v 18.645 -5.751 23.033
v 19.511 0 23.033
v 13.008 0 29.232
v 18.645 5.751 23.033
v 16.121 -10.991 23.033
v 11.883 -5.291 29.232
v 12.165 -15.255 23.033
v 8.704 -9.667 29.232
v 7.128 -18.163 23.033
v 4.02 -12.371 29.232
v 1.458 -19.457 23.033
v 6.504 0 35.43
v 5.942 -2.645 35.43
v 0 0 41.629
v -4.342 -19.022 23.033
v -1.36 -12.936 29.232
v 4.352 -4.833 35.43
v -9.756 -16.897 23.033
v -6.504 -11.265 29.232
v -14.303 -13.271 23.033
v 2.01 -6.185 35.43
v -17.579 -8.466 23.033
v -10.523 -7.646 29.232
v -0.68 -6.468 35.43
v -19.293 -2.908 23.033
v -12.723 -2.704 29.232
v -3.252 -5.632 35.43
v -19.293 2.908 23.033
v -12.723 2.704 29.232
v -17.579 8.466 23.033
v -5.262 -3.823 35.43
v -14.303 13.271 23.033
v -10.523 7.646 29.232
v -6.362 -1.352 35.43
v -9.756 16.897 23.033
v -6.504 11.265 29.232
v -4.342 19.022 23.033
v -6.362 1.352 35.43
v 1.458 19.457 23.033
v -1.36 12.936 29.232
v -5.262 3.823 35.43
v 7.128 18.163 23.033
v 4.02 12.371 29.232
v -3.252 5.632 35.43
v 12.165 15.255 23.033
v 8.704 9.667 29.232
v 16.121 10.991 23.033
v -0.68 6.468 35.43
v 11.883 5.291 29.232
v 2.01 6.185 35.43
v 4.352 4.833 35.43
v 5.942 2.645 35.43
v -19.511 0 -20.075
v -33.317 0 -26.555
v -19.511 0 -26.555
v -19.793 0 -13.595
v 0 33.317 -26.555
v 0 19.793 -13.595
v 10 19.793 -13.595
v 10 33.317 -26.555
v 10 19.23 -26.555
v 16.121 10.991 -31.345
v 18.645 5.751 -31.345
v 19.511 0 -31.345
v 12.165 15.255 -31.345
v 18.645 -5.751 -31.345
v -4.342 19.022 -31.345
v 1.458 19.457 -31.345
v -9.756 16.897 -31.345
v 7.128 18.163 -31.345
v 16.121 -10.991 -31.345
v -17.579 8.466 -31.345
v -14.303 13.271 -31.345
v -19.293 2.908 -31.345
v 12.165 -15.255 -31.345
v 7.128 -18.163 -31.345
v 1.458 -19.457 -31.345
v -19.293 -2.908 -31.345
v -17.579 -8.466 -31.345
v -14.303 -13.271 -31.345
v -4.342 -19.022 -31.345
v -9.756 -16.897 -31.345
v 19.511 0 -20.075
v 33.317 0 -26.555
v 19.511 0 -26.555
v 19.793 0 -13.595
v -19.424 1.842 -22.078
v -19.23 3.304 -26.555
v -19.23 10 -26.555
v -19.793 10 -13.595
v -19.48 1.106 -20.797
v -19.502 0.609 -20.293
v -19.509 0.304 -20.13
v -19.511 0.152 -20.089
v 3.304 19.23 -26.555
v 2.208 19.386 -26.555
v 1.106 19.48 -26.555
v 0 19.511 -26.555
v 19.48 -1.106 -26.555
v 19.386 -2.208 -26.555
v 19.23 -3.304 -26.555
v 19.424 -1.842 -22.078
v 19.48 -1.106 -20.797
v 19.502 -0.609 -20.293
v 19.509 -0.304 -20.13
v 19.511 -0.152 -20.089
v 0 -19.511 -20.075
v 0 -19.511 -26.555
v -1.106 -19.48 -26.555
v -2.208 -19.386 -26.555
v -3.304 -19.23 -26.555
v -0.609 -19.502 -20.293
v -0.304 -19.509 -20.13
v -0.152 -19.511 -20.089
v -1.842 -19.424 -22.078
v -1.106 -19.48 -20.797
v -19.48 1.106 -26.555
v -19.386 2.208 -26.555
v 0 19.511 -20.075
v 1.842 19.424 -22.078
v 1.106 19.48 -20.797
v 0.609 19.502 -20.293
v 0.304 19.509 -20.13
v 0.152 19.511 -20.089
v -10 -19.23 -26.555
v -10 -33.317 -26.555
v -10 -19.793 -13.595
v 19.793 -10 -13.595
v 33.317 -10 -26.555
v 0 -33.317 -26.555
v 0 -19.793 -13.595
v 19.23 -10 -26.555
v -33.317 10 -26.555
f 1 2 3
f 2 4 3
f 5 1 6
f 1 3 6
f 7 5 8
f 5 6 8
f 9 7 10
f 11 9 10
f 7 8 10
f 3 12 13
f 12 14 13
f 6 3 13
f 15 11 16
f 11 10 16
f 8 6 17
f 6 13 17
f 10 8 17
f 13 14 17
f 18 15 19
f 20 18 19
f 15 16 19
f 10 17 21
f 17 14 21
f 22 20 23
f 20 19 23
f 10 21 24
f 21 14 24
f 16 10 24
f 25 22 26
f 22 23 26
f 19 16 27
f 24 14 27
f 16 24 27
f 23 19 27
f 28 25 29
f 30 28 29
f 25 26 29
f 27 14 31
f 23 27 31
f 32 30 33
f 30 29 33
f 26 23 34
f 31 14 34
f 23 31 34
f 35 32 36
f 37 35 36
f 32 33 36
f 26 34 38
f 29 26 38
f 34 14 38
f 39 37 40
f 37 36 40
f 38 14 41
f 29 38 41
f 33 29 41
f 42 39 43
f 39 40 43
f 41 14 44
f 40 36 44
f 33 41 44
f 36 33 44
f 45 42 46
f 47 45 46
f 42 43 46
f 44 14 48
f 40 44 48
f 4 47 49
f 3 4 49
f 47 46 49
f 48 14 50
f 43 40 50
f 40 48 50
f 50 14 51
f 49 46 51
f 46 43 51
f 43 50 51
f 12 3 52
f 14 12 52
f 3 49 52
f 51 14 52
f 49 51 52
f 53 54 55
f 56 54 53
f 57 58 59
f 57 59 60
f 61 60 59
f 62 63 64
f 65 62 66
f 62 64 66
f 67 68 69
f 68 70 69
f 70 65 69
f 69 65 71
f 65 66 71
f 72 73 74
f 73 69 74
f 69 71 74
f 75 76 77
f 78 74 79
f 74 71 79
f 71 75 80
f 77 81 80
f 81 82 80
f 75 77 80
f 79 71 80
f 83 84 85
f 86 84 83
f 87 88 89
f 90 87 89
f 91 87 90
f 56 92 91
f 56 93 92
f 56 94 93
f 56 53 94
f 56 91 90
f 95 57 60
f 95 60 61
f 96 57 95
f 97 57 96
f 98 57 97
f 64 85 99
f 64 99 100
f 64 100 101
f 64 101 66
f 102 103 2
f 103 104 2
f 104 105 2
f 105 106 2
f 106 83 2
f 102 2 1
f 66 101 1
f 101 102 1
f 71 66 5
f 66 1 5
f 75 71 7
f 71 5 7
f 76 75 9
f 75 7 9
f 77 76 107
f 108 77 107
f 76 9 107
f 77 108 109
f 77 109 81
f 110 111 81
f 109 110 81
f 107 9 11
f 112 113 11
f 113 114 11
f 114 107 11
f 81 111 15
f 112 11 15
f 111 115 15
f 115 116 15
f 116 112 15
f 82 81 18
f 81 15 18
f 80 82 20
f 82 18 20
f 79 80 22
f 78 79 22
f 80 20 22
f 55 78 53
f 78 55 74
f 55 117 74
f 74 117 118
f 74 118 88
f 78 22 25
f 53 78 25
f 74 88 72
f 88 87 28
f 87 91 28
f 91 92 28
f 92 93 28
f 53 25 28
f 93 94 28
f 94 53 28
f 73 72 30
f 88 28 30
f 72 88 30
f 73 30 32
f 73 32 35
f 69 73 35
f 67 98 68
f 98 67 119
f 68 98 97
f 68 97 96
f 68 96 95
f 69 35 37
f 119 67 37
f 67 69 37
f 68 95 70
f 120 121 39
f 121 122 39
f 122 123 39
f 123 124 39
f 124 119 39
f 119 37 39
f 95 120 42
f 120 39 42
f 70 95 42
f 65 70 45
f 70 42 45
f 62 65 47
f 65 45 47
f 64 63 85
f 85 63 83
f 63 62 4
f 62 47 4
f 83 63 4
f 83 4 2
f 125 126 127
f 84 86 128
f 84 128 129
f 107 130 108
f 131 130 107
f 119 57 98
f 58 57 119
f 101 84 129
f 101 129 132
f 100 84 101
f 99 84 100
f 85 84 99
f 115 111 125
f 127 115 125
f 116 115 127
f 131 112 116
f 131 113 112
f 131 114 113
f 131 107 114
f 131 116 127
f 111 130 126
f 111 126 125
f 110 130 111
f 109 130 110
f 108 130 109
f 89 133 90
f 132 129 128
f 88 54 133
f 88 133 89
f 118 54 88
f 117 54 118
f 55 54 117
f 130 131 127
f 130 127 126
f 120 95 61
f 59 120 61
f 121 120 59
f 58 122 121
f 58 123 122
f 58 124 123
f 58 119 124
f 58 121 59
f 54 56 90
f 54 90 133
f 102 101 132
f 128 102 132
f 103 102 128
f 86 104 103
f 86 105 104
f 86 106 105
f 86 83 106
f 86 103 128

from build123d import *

# Parameters (mm, degrees)
F3_DEPTH        = 10
F3_COPIES_COUNT = 4


# Not quite as in the source:
# - a pattern or mirror of a feature is missing from the dataset's text; its kind, count and spacing are read off the source's solid


with BuildPart() as f1:
    # F0 (on Front) → F1 (revolve)
    with BuildSketch(Plane.XZ):
        Polygon((19.5114035159, 23.0333190411), (0, 41.6290275753), (0, -31.3450358808), (19.5114035159, -31.3450358808), align=None)
    revolve(axis=Axis((0, 0, 5.1419958472), (0, 0, -1)))

    # F2 (on Right) → F3 (join)
    with BuildSketch(Plane.YZ):
        Polygon((-19.2296542227, -26.5552345663), (-19.7931565344, -13.5945891961), (-33.3173125982, -26.5552345663), align=None)
    f3 = extrude(amount=-F3_DEPTH)

    # F3_copies: F3 ×4 about axis
    f3_copies_axis = Axis((0, 0, 0), (0, 0, 1))
    for i in range(1, F3_COPIES_COUNT):
        add(f3.rotate(f3_copies_axis, i * 360 / F3_COPIES_COUNT))


solid = f1.part
